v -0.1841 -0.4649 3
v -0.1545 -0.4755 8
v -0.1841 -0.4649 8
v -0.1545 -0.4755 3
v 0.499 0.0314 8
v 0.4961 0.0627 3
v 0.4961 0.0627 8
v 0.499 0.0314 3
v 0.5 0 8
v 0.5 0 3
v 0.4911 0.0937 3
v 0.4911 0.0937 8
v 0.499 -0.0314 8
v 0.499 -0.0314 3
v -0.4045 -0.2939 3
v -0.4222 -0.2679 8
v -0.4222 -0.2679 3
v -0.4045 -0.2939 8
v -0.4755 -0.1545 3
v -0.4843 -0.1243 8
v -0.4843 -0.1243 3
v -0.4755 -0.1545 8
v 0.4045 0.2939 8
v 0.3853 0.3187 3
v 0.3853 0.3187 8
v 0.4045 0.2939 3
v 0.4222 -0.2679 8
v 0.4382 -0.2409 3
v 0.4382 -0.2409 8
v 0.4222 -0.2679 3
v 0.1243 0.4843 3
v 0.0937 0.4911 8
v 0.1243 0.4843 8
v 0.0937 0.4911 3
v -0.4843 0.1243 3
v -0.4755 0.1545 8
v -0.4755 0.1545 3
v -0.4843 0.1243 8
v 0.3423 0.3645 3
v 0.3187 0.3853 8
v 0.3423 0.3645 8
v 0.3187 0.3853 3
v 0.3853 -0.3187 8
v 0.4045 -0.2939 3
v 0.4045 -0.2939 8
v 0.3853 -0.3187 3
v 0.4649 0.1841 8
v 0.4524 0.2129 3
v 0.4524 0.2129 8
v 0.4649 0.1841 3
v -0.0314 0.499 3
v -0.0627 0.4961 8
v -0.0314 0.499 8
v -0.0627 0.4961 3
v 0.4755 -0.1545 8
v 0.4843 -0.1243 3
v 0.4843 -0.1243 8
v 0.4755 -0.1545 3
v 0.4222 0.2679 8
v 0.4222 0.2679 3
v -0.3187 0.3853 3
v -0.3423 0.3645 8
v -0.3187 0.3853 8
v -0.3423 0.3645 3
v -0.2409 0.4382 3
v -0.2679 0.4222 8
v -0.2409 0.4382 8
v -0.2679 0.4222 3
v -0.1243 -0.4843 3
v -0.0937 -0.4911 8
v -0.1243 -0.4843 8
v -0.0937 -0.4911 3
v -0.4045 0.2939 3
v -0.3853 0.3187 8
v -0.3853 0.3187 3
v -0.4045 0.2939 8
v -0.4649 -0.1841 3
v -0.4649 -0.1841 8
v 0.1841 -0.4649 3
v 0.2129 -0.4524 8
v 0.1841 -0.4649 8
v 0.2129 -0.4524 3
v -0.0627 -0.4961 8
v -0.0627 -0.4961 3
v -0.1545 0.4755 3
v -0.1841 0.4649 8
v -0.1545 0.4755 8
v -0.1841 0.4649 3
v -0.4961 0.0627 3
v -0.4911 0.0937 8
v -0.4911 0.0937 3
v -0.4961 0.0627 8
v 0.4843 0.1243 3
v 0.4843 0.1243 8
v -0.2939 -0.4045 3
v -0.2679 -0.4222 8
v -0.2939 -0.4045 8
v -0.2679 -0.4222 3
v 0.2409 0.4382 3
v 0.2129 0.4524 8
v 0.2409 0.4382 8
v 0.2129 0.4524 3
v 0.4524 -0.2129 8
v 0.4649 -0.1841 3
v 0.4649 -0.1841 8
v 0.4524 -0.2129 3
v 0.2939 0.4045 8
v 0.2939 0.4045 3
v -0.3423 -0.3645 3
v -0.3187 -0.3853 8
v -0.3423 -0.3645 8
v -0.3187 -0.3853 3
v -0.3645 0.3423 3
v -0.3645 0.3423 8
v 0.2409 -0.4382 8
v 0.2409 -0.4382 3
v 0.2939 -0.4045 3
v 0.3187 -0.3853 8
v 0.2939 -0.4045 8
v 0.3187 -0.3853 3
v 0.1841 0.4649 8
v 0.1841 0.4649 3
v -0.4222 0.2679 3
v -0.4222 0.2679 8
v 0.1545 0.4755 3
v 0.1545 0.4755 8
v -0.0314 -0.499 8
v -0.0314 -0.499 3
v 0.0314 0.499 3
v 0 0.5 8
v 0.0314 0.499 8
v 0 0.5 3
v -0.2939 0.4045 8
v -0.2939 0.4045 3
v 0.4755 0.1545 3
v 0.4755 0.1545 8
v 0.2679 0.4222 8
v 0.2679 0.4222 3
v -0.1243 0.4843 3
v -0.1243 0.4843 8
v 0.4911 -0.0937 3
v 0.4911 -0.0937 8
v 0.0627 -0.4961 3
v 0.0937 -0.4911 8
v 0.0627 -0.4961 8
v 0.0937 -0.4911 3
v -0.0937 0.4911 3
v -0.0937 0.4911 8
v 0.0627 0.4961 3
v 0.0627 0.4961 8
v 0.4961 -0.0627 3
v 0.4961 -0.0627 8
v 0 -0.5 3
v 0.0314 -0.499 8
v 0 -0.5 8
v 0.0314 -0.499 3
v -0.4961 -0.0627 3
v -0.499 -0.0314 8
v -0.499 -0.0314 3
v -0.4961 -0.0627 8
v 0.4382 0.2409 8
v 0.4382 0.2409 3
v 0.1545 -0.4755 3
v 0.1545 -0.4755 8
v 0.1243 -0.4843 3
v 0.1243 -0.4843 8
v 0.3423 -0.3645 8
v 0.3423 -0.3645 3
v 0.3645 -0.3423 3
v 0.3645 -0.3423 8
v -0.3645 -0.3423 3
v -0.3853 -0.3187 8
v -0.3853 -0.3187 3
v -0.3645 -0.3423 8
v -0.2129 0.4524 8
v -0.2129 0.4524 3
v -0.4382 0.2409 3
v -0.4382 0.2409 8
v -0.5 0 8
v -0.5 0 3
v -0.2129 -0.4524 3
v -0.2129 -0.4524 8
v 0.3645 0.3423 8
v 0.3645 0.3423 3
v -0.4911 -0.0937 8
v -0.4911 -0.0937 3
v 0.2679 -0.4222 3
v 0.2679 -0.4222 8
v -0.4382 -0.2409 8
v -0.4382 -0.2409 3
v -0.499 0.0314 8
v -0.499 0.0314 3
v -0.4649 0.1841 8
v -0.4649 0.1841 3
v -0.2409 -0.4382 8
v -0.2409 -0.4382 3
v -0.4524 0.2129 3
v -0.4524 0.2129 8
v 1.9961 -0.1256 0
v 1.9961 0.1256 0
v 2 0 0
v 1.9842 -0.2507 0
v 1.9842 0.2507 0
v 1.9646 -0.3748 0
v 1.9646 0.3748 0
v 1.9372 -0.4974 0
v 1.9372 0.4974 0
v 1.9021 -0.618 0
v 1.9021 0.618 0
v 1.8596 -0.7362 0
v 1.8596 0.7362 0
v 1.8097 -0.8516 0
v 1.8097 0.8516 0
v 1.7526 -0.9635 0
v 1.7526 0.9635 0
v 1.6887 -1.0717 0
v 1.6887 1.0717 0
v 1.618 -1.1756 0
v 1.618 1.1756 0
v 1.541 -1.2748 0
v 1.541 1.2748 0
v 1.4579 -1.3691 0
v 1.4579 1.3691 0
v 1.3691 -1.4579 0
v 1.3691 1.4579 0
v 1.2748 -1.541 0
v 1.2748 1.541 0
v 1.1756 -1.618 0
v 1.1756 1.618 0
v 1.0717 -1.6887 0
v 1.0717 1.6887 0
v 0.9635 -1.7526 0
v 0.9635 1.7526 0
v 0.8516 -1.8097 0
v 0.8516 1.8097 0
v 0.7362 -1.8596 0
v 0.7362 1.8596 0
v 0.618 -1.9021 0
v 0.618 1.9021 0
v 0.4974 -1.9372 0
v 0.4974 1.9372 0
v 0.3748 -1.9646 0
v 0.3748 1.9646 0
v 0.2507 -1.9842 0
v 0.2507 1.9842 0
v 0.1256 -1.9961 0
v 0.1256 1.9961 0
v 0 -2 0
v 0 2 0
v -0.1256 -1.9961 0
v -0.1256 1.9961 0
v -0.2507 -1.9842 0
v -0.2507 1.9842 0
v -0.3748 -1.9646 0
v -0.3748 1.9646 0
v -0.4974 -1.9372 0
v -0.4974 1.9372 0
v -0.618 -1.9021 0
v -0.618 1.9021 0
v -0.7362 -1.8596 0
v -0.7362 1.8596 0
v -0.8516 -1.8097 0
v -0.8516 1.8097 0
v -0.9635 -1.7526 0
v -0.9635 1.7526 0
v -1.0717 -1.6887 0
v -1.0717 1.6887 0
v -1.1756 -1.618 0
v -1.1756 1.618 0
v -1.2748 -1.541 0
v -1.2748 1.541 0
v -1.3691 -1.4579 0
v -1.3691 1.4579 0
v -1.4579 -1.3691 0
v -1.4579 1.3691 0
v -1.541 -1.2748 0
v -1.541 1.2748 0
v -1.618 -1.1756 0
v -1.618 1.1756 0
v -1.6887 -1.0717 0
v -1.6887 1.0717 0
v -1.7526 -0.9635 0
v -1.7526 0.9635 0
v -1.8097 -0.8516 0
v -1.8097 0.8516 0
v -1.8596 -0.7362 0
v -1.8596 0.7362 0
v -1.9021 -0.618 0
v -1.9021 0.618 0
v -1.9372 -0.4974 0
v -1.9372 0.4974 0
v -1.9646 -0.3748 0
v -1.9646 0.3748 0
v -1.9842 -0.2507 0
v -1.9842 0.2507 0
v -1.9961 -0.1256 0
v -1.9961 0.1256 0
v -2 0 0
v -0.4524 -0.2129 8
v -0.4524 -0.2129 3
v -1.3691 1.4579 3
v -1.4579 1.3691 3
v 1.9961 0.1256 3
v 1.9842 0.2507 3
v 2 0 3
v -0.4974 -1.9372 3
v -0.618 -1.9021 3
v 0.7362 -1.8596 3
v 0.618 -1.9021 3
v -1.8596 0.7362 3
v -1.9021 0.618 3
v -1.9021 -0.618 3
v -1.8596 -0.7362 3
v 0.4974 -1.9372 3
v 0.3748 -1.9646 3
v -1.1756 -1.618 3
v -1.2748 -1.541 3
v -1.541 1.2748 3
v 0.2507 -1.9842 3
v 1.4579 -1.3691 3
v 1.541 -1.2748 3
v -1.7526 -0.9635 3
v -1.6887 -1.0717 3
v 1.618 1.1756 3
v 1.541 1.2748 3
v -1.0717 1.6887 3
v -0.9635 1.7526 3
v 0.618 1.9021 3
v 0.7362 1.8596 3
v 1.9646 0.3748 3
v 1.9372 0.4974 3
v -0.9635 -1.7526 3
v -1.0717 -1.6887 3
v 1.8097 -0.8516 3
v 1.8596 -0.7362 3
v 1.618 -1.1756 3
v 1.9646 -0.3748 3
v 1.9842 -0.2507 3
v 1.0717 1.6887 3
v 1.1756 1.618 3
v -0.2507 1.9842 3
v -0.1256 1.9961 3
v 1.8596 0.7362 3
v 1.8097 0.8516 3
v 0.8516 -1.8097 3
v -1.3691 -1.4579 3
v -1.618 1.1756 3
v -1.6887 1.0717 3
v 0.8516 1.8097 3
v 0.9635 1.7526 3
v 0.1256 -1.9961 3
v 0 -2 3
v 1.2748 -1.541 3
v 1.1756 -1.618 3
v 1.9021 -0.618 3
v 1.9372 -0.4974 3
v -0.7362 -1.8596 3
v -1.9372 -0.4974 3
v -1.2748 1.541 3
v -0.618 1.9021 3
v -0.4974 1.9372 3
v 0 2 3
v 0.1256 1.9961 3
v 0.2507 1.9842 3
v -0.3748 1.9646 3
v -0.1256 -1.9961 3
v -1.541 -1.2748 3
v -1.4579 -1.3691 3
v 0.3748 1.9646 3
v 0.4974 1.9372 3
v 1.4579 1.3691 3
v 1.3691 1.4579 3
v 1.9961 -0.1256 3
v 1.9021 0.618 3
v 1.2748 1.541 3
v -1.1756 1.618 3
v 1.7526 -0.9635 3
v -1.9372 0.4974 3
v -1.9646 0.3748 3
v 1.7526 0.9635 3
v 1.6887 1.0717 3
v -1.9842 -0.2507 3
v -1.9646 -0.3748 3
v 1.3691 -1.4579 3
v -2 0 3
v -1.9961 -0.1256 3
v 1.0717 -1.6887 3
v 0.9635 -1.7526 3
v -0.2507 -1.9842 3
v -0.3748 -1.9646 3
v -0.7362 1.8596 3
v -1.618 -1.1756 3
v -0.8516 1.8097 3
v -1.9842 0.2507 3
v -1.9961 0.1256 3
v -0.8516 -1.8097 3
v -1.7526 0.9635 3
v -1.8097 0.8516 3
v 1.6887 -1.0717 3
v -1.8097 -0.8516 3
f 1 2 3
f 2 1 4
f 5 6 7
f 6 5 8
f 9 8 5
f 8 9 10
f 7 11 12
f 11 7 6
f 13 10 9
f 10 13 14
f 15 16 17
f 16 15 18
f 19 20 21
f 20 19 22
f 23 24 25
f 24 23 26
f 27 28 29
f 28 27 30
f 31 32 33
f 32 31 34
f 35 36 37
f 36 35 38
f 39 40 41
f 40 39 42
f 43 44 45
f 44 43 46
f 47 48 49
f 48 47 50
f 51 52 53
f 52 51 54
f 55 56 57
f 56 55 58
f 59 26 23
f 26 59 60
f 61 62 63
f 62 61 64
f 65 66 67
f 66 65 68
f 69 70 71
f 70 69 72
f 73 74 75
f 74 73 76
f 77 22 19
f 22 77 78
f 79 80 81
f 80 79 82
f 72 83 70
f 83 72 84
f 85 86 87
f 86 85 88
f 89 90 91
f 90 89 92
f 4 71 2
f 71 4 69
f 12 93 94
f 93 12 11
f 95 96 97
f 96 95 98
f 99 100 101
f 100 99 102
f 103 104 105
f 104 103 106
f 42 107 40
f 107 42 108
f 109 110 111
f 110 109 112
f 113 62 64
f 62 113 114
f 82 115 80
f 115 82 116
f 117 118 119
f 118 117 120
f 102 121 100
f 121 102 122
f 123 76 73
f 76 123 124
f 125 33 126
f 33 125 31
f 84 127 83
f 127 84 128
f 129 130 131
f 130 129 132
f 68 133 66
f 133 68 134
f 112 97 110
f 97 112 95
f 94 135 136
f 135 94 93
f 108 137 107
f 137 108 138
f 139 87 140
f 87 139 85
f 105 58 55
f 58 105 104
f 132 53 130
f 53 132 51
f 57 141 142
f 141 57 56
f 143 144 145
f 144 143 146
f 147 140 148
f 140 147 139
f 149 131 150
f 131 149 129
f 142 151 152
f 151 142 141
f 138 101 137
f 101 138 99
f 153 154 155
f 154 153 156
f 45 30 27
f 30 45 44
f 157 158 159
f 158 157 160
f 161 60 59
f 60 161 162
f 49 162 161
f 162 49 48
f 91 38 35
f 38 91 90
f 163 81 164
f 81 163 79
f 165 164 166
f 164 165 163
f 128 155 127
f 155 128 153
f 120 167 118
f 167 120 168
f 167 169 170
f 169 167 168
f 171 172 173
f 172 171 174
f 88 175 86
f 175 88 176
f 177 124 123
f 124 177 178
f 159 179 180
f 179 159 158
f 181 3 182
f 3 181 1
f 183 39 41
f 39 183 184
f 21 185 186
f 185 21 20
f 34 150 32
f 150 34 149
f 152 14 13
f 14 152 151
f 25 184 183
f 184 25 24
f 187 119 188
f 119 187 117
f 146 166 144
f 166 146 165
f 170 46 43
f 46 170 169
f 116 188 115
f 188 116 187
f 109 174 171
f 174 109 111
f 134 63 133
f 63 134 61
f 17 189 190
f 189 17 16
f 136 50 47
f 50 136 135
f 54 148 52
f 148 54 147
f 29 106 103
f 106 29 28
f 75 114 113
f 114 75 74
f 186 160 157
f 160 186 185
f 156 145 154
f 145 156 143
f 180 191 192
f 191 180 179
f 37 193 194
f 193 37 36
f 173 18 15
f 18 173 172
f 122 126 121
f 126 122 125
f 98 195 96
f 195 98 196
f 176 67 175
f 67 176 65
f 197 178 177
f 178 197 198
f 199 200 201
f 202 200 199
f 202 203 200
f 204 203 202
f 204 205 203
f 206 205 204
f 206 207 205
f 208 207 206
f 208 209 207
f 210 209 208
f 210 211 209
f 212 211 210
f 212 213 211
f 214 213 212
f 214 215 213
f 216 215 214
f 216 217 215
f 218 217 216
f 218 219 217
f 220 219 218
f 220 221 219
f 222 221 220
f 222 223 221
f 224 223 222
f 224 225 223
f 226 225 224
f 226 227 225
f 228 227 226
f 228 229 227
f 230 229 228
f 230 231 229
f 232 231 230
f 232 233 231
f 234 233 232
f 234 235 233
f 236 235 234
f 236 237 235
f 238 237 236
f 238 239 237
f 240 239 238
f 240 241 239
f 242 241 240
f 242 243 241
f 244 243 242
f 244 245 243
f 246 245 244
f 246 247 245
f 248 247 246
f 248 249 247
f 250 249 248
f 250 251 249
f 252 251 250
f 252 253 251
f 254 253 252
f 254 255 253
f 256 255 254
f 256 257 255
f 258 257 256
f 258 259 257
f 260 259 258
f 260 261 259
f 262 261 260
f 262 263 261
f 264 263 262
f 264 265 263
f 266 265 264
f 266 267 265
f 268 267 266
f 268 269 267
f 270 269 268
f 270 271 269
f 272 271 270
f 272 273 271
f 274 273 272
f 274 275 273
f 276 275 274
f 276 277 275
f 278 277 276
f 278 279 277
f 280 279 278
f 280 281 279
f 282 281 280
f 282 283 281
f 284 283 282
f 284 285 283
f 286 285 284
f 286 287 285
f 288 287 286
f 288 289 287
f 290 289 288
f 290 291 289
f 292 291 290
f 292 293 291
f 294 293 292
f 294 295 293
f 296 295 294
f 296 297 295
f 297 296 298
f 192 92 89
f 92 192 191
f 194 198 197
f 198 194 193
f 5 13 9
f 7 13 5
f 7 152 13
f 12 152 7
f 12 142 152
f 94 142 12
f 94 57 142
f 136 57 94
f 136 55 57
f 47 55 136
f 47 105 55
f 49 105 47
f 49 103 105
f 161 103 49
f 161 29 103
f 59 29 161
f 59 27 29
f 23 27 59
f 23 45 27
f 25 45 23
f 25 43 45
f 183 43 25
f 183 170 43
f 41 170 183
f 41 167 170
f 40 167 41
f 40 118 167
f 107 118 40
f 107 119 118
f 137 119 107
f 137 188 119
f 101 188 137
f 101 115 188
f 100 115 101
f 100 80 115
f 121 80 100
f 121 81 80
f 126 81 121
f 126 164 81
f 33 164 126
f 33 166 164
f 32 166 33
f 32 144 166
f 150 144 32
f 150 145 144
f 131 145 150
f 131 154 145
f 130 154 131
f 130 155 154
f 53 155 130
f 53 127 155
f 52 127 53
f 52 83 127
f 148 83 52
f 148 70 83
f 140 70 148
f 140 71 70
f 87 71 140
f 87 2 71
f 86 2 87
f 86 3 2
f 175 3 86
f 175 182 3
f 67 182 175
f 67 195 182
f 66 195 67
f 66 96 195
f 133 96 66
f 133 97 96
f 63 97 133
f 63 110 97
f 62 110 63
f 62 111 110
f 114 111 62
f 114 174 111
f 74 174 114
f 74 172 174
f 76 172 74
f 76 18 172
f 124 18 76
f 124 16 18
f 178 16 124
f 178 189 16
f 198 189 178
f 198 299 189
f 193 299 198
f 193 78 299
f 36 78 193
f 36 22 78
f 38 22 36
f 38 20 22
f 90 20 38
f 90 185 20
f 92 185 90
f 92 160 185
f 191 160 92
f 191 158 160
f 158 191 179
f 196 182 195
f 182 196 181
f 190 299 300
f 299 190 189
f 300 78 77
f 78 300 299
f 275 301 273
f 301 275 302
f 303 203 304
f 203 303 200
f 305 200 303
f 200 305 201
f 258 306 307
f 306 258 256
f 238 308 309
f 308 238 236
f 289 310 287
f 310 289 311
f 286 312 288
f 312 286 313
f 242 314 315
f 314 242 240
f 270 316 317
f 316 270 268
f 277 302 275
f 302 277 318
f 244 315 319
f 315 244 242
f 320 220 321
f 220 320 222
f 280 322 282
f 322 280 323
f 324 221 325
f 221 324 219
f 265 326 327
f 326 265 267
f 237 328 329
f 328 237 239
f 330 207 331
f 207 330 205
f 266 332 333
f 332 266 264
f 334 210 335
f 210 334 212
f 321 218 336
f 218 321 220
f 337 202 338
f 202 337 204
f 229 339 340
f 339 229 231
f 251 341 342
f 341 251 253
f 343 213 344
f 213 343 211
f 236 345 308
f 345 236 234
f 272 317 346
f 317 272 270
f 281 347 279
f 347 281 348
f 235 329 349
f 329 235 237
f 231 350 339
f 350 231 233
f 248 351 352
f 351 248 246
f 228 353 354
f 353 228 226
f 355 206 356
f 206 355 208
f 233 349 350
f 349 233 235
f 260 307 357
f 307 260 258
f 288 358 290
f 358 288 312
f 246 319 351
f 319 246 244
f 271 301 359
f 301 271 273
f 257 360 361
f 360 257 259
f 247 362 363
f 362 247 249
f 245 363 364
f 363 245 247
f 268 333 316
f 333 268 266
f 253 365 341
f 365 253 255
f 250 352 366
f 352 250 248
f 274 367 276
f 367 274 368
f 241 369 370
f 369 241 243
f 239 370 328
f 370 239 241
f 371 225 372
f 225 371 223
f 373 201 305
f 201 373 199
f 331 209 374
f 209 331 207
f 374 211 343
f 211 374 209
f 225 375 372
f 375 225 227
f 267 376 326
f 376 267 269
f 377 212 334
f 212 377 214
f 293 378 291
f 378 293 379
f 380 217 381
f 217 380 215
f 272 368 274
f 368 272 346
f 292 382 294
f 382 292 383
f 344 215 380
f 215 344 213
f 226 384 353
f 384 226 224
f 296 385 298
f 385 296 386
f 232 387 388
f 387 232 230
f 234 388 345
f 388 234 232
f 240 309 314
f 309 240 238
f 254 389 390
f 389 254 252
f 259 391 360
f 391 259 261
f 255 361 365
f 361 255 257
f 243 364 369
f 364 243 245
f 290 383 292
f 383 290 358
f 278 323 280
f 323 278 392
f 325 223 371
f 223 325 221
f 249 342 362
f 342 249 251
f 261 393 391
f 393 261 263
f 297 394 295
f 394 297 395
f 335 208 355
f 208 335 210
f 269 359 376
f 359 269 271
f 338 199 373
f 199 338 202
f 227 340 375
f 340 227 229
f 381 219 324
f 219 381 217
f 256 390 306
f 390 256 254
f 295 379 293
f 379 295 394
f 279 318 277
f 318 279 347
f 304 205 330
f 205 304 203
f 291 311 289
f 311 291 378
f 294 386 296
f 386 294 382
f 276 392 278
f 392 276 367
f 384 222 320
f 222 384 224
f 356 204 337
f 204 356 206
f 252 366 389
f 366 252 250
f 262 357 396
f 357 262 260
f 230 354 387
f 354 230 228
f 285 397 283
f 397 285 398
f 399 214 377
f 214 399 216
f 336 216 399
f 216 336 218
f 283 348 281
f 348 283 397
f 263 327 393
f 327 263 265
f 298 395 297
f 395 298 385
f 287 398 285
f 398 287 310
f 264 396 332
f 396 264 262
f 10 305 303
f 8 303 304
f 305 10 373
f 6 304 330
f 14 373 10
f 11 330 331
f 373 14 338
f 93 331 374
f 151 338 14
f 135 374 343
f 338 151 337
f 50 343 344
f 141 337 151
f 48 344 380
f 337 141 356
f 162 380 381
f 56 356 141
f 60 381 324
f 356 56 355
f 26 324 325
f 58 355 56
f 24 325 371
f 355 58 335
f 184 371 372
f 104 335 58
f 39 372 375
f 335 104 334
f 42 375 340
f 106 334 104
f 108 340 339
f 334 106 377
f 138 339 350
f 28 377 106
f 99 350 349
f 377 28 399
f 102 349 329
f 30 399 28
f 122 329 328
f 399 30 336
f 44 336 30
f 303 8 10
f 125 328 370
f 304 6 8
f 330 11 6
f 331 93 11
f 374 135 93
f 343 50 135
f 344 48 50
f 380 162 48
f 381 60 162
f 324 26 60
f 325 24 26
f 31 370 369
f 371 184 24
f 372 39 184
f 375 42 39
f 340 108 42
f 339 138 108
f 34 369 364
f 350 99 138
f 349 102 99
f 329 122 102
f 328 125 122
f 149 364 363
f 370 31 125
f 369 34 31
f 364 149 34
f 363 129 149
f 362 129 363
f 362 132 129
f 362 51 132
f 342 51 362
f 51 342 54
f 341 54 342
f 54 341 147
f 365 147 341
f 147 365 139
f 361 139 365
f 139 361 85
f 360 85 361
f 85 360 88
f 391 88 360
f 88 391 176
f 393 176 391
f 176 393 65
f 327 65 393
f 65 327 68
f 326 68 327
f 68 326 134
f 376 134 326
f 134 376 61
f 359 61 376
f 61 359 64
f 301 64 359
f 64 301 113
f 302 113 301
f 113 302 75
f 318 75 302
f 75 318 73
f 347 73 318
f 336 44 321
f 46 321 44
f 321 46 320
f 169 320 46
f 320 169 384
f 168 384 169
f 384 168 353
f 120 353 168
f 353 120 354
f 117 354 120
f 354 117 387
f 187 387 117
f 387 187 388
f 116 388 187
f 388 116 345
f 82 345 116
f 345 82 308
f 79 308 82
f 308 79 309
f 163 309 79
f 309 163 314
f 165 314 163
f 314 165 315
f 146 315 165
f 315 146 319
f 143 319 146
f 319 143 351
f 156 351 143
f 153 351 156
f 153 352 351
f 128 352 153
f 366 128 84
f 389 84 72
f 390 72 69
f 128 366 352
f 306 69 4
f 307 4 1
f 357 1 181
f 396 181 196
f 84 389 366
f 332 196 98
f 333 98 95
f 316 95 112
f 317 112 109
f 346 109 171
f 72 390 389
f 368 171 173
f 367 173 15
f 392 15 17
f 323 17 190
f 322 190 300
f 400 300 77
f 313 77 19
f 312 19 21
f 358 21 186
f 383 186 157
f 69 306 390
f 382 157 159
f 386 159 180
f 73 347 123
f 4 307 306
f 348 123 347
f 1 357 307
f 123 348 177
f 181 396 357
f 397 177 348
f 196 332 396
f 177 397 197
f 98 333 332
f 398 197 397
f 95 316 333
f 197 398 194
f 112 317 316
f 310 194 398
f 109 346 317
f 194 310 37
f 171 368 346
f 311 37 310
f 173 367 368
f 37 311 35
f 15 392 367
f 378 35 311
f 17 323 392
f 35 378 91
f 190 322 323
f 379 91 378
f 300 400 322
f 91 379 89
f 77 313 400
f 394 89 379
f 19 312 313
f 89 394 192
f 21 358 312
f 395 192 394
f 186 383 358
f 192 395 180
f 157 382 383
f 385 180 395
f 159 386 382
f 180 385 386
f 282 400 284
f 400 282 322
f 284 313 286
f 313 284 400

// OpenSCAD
external_diameter = 1;

$fn=100;

cylinder(8, external_diameter/2, external_diameter/2);
cylinder(3, external_diameter*2, external_diameter*2);
